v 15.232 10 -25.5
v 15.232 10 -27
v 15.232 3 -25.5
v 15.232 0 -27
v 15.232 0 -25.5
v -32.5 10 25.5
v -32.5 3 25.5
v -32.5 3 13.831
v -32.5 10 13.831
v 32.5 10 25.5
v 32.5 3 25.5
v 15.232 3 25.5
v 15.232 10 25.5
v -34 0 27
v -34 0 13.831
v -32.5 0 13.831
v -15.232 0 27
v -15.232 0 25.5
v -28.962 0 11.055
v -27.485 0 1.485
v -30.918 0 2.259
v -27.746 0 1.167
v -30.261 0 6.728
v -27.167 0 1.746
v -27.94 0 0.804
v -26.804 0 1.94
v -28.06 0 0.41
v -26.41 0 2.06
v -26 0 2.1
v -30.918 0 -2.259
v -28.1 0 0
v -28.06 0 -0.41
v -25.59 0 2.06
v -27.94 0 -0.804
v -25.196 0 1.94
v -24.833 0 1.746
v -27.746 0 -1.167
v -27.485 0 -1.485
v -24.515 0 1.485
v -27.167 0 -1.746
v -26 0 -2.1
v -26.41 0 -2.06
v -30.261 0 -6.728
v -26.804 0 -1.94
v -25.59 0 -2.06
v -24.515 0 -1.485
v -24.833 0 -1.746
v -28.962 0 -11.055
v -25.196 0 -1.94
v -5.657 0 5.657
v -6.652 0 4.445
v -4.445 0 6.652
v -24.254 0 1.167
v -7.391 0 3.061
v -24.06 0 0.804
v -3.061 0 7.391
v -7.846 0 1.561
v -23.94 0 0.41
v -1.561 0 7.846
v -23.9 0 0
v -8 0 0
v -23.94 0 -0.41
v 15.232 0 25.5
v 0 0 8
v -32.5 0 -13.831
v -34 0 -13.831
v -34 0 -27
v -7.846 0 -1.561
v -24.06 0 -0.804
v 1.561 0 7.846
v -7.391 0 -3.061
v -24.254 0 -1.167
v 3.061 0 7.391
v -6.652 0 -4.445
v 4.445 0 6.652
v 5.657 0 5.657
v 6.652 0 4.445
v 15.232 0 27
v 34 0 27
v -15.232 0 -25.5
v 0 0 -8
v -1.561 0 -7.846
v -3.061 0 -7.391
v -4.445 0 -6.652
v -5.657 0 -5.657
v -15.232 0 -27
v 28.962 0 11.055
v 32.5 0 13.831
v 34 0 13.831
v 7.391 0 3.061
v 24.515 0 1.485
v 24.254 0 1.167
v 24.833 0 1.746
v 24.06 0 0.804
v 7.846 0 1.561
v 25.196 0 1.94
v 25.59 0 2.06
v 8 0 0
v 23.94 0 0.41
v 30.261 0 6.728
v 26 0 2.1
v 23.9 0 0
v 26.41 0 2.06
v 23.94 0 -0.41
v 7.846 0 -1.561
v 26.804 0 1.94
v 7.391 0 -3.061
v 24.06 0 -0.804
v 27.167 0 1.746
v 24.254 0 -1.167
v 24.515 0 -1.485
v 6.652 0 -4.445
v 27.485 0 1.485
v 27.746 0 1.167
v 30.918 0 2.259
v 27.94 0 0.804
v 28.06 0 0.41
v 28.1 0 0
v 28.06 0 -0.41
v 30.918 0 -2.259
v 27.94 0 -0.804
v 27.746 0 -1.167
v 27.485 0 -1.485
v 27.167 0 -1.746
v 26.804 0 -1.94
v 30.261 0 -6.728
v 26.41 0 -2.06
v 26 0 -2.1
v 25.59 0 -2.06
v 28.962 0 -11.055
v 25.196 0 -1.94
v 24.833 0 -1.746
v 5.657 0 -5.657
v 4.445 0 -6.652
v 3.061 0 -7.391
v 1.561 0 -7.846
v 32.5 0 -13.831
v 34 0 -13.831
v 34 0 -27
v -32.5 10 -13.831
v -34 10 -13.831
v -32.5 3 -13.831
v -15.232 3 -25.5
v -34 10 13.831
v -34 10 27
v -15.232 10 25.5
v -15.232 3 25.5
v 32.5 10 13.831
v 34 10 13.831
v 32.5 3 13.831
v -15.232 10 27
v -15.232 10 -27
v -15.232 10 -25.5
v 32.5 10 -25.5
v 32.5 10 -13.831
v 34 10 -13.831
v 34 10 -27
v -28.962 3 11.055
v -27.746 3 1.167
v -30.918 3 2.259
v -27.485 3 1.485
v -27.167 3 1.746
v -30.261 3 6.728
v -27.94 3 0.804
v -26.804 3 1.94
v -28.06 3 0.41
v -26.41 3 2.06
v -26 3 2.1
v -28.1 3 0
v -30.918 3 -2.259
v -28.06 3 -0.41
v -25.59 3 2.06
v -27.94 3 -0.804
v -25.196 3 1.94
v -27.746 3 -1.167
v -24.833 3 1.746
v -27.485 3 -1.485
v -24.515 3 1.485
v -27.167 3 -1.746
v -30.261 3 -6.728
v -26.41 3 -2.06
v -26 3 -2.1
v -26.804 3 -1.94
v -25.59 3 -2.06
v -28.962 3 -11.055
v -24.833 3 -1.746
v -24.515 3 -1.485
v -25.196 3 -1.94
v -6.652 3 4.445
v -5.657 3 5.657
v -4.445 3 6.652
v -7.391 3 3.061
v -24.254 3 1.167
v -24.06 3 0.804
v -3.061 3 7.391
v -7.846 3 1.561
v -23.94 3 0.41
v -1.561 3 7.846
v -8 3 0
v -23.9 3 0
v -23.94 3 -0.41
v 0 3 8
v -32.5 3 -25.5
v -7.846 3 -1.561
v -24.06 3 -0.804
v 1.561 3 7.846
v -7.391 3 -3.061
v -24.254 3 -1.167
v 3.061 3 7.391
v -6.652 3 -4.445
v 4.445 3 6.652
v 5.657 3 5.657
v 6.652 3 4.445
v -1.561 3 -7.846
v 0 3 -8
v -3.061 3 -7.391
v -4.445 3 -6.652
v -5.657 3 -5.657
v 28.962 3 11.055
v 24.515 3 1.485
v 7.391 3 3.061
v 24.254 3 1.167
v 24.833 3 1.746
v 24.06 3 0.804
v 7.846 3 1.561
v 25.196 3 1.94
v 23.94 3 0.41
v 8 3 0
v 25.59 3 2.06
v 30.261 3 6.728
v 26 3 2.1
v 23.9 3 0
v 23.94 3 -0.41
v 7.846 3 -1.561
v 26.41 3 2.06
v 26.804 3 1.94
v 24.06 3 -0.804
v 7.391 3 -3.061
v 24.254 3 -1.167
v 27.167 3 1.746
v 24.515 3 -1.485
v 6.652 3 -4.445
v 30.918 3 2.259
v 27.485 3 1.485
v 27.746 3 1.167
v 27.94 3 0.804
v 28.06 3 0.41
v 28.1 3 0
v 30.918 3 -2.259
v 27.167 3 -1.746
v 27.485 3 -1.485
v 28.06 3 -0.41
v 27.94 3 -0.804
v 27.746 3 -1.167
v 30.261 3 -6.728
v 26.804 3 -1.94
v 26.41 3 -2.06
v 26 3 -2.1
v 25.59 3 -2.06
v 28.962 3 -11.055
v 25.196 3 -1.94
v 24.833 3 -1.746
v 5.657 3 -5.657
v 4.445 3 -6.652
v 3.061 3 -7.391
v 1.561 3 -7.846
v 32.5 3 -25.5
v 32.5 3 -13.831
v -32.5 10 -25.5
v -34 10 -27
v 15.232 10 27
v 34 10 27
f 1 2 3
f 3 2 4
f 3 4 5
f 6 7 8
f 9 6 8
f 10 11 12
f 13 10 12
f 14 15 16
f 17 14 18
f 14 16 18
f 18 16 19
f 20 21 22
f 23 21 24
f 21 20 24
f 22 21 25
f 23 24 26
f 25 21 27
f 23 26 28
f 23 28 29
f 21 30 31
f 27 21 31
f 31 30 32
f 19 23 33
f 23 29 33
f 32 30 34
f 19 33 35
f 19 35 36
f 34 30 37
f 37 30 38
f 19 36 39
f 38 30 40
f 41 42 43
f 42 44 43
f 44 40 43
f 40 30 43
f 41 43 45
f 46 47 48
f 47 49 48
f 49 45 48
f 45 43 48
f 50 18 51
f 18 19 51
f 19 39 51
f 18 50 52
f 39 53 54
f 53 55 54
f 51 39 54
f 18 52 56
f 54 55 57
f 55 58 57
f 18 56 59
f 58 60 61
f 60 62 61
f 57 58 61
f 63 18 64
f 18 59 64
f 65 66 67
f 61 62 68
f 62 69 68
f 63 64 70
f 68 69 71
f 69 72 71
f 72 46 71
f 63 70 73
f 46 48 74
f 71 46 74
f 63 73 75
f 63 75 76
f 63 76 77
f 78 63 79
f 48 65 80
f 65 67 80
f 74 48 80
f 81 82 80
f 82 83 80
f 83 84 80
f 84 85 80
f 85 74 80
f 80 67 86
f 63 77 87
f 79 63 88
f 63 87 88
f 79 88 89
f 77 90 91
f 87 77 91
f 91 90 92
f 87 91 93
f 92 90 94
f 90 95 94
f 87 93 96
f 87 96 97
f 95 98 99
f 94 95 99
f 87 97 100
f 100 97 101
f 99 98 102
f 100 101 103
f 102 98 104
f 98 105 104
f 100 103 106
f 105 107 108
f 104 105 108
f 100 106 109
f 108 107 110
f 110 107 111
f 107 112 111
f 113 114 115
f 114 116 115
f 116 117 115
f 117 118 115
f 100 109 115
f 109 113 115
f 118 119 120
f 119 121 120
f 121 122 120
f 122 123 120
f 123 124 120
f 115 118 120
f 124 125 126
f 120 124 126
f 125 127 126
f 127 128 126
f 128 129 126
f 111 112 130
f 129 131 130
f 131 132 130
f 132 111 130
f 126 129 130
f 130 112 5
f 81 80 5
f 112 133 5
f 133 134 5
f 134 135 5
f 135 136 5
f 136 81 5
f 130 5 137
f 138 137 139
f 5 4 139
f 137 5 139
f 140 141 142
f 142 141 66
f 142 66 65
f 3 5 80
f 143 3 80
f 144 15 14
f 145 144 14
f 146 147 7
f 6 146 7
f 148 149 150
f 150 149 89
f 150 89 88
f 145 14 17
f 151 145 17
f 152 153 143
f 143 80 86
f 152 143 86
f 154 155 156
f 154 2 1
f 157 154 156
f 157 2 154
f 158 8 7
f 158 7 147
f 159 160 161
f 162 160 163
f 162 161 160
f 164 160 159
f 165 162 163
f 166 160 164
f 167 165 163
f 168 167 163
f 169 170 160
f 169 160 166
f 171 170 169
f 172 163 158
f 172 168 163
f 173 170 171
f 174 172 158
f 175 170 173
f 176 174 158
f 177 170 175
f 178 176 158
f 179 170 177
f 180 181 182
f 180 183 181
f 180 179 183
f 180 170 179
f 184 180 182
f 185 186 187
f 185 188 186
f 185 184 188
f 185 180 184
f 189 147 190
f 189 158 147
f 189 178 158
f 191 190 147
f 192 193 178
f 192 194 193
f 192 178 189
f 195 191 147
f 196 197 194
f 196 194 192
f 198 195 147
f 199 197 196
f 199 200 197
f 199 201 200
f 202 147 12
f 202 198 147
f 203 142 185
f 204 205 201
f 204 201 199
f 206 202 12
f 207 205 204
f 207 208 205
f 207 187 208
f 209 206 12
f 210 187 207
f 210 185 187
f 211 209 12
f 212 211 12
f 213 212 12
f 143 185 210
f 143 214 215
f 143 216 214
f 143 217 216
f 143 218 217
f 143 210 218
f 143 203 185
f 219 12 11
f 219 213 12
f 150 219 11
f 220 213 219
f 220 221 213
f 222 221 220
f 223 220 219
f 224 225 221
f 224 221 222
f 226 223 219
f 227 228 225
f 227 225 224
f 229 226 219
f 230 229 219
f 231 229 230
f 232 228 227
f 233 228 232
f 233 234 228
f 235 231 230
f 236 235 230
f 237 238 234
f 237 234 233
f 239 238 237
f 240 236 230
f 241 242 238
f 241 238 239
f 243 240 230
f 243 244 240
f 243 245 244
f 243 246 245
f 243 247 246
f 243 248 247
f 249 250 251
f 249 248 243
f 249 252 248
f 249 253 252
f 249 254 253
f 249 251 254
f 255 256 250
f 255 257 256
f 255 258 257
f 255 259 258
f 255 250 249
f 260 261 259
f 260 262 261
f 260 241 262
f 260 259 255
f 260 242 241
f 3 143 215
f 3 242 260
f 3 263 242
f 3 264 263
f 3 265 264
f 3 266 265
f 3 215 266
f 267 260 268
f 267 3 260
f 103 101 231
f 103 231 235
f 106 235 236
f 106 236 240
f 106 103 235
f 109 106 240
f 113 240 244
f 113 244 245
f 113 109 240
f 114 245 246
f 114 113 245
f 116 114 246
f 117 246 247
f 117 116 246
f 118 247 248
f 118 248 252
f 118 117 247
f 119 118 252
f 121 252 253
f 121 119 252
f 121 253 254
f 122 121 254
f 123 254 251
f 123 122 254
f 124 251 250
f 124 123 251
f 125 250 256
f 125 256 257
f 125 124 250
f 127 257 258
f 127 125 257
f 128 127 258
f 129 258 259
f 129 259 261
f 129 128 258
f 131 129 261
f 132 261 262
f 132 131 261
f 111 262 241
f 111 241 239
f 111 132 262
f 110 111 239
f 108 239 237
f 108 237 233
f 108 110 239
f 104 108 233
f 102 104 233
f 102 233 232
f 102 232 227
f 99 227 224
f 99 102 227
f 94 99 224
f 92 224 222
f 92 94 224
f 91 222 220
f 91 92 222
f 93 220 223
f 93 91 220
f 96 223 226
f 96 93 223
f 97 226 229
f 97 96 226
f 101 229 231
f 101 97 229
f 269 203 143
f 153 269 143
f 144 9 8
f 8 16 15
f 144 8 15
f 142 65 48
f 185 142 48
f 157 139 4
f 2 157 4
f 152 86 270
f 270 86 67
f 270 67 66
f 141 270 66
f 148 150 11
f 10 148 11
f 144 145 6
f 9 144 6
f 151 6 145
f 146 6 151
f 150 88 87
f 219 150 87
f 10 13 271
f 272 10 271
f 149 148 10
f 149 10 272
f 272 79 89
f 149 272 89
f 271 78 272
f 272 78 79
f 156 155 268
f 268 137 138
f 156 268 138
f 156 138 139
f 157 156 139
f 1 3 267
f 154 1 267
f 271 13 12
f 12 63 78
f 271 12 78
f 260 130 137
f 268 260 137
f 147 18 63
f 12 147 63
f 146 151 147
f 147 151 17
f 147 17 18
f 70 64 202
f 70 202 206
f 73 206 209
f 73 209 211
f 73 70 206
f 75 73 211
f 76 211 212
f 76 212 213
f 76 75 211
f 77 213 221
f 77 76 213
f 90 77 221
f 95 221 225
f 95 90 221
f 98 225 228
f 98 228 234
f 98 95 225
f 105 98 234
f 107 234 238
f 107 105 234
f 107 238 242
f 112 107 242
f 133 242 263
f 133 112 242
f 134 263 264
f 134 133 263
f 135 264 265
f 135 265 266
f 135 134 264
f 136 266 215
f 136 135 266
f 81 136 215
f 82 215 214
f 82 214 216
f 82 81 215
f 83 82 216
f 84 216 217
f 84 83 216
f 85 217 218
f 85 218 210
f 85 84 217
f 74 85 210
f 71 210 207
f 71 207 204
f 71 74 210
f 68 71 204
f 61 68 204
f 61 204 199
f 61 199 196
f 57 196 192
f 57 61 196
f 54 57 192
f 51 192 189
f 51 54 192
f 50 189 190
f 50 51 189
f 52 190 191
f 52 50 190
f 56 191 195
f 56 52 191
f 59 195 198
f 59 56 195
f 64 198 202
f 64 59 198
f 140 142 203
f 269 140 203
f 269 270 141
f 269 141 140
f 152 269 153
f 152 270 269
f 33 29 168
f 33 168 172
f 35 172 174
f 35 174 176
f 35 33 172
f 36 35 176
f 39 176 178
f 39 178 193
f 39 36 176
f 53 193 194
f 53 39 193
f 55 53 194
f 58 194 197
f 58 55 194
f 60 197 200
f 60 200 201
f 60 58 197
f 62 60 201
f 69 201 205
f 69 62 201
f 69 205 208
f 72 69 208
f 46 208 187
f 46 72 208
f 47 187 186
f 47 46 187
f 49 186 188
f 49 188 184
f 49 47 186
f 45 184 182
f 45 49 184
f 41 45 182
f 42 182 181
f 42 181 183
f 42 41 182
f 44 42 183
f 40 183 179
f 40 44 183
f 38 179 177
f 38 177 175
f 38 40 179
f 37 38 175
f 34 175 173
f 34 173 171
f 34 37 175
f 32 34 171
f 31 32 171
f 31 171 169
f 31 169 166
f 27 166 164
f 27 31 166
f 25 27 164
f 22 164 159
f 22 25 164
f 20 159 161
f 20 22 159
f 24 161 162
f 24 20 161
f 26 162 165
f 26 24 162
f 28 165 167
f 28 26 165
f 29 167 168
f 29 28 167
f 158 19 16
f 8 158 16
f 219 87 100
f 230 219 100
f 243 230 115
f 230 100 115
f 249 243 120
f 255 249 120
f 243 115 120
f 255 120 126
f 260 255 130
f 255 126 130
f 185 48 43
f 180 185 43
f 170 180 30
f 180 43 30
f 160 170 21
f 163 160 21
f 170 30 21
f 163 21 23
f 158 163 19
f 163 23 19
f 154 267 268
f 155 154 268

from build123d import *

# Parameters (mm, degrees)
BOSS_EXTRUDE1_DEPTH   = 10
BOSS_EXTRUDE1_2_DEPTH = 10
BOSS_EXTRUDE1_3_DEPTH = 10
BOSS_EXTRUDE1_4_DEPTH = 10
SKETCH1_9_R           = 8
SKETCH1_9_R_2         = 2.1
BOSS_EXTRUDE2_DEPTH   = 3


with BuildPart() as part:
    # Sketch1 → Boss-Extrude1 (new body)
    with BuildSketch(Plane(origin=(0, 0, 0), x_dir=(1, 0, 0), z_dir=(0, 1, 0))):
        Polygon((32.5, -13.831280473), (32.5, -25.5), (15.231546212, -25.5), (15.231546212, -27), (34, -27), (34, -13.831280473), align=None)
    extrude(amount=BOSS_EXTRUDE1_DEPTH)



with BuildPart() as body_2:
    # Sketch1 → Boss-Extrude1 2 (new body)
    with BuildSketch(Plane(origin=(0, 0, 0), x_dir=(1, 0, 0), z_dir=(0, 1, 0))):
        Polygon((32.5, 25.5), (32.5, 13.831280473), (34, 13.831280473), (34, 27), (15.231546212, 27), (15.231546212, 25.5), align=None)
    extrude(amount=BOSS_EXTRUDE1_2_DEPTH)


with BuildPart() as body_3:
    # Sketch1 → Boss-Extrude1 3 (new body)
    with BuildSketch(Plane(origin=(0, 0, 0), x_dir=(1, 0, 0), z_dir=(0, 1, 0))):
        Polygon((-15.231546212, -27), (-15.231546212, -25.5), (-32.5, -25.5), (-32.5, -13.831280473), (-34, -13.831280473), (-34, -27), align=None)
    extrude(amount=BOSS_EXTRUDE1_3_DEPTH)


with BuildPart() as body_4:
    # Sketch1 → Boss-Extrude1 4 (new body)
    with BuildSketch(Plane(origin=(0, 0, 0), x_dir=(1, 0, 0), z_dir=(0, 1, 0))):
        Polygon((-32.5, 25.5), (-15.231546212, 25.5), (-15.231546212, 27), (-34, 27), (-34, 13.831280473), (-32.5, 13.831280473), align=None)
    extrude(amount=BOSS_EXTRUDE1_4_DEPTH)


with BuildPart() as part_1:
    add(part.part)

    add(body_2.part)  # Boss-Extrude2 merges body 2

    add(body_3.part)  # Boss-Extrude2 merges body 3

    add(body_4.part)  # Boss-Extrude2 merges body 4
    # Sketch1<9> → Boss-Extrude2 (add)
    with BuildSketch(Plane(origin=(0, 0, 0), x_dir=(1, 0, 0), z_dir=(0, 1, 0))):
        with BuildLine():
            Line((32.5, -25.5), (32.5, -13.831280473))
            Line((32.5, -13.831280473), (28.961769494, -11.055130384))
            ThreePointArc((28.961769494, -11.055130384), (31, 0), (28.961769494, 11.055130384))
            Line((28.961769494, 11.055130384), (32.5, 13.831280473))
            Line((32.5, 13.831280473), (32.5, 25.5))
            Line((32.5, 25.5), (-32.5, 25.5))
            Line((-32.5, 25.5), (-32.5, 13.831280473))
            Line((-32.5, 13.831280473), (-28.961769494, 11.055130384))
            ThreePointArc((-28.961769494, 11.055130384), (-31, 0), (-28.961769494, -11.055130384))
            Line((-28.961769494, -11.055130384), (-32.5, -13.831280473))
            Line((-32.5, -13.831280473), (-32.5, -25.5))
            Line((-32.5, -25.5), (32.5, -25.5))
        make_face()
        Circle(SKETCH1_9_R, mode=Mode.SUBTRACT)
        with Locations((26, 0)):
            Circle(SKETCH1_9_R_2, mode=Mode.SUBTRACT)
        with Locations((-26, 0)):
            Circle(SKETCH1_9_R_2, mode=Mode.SUBTRACT)
    extrude(amount=BOSS_EXTRUDE2_DEPTH)


solid = part_1.part
